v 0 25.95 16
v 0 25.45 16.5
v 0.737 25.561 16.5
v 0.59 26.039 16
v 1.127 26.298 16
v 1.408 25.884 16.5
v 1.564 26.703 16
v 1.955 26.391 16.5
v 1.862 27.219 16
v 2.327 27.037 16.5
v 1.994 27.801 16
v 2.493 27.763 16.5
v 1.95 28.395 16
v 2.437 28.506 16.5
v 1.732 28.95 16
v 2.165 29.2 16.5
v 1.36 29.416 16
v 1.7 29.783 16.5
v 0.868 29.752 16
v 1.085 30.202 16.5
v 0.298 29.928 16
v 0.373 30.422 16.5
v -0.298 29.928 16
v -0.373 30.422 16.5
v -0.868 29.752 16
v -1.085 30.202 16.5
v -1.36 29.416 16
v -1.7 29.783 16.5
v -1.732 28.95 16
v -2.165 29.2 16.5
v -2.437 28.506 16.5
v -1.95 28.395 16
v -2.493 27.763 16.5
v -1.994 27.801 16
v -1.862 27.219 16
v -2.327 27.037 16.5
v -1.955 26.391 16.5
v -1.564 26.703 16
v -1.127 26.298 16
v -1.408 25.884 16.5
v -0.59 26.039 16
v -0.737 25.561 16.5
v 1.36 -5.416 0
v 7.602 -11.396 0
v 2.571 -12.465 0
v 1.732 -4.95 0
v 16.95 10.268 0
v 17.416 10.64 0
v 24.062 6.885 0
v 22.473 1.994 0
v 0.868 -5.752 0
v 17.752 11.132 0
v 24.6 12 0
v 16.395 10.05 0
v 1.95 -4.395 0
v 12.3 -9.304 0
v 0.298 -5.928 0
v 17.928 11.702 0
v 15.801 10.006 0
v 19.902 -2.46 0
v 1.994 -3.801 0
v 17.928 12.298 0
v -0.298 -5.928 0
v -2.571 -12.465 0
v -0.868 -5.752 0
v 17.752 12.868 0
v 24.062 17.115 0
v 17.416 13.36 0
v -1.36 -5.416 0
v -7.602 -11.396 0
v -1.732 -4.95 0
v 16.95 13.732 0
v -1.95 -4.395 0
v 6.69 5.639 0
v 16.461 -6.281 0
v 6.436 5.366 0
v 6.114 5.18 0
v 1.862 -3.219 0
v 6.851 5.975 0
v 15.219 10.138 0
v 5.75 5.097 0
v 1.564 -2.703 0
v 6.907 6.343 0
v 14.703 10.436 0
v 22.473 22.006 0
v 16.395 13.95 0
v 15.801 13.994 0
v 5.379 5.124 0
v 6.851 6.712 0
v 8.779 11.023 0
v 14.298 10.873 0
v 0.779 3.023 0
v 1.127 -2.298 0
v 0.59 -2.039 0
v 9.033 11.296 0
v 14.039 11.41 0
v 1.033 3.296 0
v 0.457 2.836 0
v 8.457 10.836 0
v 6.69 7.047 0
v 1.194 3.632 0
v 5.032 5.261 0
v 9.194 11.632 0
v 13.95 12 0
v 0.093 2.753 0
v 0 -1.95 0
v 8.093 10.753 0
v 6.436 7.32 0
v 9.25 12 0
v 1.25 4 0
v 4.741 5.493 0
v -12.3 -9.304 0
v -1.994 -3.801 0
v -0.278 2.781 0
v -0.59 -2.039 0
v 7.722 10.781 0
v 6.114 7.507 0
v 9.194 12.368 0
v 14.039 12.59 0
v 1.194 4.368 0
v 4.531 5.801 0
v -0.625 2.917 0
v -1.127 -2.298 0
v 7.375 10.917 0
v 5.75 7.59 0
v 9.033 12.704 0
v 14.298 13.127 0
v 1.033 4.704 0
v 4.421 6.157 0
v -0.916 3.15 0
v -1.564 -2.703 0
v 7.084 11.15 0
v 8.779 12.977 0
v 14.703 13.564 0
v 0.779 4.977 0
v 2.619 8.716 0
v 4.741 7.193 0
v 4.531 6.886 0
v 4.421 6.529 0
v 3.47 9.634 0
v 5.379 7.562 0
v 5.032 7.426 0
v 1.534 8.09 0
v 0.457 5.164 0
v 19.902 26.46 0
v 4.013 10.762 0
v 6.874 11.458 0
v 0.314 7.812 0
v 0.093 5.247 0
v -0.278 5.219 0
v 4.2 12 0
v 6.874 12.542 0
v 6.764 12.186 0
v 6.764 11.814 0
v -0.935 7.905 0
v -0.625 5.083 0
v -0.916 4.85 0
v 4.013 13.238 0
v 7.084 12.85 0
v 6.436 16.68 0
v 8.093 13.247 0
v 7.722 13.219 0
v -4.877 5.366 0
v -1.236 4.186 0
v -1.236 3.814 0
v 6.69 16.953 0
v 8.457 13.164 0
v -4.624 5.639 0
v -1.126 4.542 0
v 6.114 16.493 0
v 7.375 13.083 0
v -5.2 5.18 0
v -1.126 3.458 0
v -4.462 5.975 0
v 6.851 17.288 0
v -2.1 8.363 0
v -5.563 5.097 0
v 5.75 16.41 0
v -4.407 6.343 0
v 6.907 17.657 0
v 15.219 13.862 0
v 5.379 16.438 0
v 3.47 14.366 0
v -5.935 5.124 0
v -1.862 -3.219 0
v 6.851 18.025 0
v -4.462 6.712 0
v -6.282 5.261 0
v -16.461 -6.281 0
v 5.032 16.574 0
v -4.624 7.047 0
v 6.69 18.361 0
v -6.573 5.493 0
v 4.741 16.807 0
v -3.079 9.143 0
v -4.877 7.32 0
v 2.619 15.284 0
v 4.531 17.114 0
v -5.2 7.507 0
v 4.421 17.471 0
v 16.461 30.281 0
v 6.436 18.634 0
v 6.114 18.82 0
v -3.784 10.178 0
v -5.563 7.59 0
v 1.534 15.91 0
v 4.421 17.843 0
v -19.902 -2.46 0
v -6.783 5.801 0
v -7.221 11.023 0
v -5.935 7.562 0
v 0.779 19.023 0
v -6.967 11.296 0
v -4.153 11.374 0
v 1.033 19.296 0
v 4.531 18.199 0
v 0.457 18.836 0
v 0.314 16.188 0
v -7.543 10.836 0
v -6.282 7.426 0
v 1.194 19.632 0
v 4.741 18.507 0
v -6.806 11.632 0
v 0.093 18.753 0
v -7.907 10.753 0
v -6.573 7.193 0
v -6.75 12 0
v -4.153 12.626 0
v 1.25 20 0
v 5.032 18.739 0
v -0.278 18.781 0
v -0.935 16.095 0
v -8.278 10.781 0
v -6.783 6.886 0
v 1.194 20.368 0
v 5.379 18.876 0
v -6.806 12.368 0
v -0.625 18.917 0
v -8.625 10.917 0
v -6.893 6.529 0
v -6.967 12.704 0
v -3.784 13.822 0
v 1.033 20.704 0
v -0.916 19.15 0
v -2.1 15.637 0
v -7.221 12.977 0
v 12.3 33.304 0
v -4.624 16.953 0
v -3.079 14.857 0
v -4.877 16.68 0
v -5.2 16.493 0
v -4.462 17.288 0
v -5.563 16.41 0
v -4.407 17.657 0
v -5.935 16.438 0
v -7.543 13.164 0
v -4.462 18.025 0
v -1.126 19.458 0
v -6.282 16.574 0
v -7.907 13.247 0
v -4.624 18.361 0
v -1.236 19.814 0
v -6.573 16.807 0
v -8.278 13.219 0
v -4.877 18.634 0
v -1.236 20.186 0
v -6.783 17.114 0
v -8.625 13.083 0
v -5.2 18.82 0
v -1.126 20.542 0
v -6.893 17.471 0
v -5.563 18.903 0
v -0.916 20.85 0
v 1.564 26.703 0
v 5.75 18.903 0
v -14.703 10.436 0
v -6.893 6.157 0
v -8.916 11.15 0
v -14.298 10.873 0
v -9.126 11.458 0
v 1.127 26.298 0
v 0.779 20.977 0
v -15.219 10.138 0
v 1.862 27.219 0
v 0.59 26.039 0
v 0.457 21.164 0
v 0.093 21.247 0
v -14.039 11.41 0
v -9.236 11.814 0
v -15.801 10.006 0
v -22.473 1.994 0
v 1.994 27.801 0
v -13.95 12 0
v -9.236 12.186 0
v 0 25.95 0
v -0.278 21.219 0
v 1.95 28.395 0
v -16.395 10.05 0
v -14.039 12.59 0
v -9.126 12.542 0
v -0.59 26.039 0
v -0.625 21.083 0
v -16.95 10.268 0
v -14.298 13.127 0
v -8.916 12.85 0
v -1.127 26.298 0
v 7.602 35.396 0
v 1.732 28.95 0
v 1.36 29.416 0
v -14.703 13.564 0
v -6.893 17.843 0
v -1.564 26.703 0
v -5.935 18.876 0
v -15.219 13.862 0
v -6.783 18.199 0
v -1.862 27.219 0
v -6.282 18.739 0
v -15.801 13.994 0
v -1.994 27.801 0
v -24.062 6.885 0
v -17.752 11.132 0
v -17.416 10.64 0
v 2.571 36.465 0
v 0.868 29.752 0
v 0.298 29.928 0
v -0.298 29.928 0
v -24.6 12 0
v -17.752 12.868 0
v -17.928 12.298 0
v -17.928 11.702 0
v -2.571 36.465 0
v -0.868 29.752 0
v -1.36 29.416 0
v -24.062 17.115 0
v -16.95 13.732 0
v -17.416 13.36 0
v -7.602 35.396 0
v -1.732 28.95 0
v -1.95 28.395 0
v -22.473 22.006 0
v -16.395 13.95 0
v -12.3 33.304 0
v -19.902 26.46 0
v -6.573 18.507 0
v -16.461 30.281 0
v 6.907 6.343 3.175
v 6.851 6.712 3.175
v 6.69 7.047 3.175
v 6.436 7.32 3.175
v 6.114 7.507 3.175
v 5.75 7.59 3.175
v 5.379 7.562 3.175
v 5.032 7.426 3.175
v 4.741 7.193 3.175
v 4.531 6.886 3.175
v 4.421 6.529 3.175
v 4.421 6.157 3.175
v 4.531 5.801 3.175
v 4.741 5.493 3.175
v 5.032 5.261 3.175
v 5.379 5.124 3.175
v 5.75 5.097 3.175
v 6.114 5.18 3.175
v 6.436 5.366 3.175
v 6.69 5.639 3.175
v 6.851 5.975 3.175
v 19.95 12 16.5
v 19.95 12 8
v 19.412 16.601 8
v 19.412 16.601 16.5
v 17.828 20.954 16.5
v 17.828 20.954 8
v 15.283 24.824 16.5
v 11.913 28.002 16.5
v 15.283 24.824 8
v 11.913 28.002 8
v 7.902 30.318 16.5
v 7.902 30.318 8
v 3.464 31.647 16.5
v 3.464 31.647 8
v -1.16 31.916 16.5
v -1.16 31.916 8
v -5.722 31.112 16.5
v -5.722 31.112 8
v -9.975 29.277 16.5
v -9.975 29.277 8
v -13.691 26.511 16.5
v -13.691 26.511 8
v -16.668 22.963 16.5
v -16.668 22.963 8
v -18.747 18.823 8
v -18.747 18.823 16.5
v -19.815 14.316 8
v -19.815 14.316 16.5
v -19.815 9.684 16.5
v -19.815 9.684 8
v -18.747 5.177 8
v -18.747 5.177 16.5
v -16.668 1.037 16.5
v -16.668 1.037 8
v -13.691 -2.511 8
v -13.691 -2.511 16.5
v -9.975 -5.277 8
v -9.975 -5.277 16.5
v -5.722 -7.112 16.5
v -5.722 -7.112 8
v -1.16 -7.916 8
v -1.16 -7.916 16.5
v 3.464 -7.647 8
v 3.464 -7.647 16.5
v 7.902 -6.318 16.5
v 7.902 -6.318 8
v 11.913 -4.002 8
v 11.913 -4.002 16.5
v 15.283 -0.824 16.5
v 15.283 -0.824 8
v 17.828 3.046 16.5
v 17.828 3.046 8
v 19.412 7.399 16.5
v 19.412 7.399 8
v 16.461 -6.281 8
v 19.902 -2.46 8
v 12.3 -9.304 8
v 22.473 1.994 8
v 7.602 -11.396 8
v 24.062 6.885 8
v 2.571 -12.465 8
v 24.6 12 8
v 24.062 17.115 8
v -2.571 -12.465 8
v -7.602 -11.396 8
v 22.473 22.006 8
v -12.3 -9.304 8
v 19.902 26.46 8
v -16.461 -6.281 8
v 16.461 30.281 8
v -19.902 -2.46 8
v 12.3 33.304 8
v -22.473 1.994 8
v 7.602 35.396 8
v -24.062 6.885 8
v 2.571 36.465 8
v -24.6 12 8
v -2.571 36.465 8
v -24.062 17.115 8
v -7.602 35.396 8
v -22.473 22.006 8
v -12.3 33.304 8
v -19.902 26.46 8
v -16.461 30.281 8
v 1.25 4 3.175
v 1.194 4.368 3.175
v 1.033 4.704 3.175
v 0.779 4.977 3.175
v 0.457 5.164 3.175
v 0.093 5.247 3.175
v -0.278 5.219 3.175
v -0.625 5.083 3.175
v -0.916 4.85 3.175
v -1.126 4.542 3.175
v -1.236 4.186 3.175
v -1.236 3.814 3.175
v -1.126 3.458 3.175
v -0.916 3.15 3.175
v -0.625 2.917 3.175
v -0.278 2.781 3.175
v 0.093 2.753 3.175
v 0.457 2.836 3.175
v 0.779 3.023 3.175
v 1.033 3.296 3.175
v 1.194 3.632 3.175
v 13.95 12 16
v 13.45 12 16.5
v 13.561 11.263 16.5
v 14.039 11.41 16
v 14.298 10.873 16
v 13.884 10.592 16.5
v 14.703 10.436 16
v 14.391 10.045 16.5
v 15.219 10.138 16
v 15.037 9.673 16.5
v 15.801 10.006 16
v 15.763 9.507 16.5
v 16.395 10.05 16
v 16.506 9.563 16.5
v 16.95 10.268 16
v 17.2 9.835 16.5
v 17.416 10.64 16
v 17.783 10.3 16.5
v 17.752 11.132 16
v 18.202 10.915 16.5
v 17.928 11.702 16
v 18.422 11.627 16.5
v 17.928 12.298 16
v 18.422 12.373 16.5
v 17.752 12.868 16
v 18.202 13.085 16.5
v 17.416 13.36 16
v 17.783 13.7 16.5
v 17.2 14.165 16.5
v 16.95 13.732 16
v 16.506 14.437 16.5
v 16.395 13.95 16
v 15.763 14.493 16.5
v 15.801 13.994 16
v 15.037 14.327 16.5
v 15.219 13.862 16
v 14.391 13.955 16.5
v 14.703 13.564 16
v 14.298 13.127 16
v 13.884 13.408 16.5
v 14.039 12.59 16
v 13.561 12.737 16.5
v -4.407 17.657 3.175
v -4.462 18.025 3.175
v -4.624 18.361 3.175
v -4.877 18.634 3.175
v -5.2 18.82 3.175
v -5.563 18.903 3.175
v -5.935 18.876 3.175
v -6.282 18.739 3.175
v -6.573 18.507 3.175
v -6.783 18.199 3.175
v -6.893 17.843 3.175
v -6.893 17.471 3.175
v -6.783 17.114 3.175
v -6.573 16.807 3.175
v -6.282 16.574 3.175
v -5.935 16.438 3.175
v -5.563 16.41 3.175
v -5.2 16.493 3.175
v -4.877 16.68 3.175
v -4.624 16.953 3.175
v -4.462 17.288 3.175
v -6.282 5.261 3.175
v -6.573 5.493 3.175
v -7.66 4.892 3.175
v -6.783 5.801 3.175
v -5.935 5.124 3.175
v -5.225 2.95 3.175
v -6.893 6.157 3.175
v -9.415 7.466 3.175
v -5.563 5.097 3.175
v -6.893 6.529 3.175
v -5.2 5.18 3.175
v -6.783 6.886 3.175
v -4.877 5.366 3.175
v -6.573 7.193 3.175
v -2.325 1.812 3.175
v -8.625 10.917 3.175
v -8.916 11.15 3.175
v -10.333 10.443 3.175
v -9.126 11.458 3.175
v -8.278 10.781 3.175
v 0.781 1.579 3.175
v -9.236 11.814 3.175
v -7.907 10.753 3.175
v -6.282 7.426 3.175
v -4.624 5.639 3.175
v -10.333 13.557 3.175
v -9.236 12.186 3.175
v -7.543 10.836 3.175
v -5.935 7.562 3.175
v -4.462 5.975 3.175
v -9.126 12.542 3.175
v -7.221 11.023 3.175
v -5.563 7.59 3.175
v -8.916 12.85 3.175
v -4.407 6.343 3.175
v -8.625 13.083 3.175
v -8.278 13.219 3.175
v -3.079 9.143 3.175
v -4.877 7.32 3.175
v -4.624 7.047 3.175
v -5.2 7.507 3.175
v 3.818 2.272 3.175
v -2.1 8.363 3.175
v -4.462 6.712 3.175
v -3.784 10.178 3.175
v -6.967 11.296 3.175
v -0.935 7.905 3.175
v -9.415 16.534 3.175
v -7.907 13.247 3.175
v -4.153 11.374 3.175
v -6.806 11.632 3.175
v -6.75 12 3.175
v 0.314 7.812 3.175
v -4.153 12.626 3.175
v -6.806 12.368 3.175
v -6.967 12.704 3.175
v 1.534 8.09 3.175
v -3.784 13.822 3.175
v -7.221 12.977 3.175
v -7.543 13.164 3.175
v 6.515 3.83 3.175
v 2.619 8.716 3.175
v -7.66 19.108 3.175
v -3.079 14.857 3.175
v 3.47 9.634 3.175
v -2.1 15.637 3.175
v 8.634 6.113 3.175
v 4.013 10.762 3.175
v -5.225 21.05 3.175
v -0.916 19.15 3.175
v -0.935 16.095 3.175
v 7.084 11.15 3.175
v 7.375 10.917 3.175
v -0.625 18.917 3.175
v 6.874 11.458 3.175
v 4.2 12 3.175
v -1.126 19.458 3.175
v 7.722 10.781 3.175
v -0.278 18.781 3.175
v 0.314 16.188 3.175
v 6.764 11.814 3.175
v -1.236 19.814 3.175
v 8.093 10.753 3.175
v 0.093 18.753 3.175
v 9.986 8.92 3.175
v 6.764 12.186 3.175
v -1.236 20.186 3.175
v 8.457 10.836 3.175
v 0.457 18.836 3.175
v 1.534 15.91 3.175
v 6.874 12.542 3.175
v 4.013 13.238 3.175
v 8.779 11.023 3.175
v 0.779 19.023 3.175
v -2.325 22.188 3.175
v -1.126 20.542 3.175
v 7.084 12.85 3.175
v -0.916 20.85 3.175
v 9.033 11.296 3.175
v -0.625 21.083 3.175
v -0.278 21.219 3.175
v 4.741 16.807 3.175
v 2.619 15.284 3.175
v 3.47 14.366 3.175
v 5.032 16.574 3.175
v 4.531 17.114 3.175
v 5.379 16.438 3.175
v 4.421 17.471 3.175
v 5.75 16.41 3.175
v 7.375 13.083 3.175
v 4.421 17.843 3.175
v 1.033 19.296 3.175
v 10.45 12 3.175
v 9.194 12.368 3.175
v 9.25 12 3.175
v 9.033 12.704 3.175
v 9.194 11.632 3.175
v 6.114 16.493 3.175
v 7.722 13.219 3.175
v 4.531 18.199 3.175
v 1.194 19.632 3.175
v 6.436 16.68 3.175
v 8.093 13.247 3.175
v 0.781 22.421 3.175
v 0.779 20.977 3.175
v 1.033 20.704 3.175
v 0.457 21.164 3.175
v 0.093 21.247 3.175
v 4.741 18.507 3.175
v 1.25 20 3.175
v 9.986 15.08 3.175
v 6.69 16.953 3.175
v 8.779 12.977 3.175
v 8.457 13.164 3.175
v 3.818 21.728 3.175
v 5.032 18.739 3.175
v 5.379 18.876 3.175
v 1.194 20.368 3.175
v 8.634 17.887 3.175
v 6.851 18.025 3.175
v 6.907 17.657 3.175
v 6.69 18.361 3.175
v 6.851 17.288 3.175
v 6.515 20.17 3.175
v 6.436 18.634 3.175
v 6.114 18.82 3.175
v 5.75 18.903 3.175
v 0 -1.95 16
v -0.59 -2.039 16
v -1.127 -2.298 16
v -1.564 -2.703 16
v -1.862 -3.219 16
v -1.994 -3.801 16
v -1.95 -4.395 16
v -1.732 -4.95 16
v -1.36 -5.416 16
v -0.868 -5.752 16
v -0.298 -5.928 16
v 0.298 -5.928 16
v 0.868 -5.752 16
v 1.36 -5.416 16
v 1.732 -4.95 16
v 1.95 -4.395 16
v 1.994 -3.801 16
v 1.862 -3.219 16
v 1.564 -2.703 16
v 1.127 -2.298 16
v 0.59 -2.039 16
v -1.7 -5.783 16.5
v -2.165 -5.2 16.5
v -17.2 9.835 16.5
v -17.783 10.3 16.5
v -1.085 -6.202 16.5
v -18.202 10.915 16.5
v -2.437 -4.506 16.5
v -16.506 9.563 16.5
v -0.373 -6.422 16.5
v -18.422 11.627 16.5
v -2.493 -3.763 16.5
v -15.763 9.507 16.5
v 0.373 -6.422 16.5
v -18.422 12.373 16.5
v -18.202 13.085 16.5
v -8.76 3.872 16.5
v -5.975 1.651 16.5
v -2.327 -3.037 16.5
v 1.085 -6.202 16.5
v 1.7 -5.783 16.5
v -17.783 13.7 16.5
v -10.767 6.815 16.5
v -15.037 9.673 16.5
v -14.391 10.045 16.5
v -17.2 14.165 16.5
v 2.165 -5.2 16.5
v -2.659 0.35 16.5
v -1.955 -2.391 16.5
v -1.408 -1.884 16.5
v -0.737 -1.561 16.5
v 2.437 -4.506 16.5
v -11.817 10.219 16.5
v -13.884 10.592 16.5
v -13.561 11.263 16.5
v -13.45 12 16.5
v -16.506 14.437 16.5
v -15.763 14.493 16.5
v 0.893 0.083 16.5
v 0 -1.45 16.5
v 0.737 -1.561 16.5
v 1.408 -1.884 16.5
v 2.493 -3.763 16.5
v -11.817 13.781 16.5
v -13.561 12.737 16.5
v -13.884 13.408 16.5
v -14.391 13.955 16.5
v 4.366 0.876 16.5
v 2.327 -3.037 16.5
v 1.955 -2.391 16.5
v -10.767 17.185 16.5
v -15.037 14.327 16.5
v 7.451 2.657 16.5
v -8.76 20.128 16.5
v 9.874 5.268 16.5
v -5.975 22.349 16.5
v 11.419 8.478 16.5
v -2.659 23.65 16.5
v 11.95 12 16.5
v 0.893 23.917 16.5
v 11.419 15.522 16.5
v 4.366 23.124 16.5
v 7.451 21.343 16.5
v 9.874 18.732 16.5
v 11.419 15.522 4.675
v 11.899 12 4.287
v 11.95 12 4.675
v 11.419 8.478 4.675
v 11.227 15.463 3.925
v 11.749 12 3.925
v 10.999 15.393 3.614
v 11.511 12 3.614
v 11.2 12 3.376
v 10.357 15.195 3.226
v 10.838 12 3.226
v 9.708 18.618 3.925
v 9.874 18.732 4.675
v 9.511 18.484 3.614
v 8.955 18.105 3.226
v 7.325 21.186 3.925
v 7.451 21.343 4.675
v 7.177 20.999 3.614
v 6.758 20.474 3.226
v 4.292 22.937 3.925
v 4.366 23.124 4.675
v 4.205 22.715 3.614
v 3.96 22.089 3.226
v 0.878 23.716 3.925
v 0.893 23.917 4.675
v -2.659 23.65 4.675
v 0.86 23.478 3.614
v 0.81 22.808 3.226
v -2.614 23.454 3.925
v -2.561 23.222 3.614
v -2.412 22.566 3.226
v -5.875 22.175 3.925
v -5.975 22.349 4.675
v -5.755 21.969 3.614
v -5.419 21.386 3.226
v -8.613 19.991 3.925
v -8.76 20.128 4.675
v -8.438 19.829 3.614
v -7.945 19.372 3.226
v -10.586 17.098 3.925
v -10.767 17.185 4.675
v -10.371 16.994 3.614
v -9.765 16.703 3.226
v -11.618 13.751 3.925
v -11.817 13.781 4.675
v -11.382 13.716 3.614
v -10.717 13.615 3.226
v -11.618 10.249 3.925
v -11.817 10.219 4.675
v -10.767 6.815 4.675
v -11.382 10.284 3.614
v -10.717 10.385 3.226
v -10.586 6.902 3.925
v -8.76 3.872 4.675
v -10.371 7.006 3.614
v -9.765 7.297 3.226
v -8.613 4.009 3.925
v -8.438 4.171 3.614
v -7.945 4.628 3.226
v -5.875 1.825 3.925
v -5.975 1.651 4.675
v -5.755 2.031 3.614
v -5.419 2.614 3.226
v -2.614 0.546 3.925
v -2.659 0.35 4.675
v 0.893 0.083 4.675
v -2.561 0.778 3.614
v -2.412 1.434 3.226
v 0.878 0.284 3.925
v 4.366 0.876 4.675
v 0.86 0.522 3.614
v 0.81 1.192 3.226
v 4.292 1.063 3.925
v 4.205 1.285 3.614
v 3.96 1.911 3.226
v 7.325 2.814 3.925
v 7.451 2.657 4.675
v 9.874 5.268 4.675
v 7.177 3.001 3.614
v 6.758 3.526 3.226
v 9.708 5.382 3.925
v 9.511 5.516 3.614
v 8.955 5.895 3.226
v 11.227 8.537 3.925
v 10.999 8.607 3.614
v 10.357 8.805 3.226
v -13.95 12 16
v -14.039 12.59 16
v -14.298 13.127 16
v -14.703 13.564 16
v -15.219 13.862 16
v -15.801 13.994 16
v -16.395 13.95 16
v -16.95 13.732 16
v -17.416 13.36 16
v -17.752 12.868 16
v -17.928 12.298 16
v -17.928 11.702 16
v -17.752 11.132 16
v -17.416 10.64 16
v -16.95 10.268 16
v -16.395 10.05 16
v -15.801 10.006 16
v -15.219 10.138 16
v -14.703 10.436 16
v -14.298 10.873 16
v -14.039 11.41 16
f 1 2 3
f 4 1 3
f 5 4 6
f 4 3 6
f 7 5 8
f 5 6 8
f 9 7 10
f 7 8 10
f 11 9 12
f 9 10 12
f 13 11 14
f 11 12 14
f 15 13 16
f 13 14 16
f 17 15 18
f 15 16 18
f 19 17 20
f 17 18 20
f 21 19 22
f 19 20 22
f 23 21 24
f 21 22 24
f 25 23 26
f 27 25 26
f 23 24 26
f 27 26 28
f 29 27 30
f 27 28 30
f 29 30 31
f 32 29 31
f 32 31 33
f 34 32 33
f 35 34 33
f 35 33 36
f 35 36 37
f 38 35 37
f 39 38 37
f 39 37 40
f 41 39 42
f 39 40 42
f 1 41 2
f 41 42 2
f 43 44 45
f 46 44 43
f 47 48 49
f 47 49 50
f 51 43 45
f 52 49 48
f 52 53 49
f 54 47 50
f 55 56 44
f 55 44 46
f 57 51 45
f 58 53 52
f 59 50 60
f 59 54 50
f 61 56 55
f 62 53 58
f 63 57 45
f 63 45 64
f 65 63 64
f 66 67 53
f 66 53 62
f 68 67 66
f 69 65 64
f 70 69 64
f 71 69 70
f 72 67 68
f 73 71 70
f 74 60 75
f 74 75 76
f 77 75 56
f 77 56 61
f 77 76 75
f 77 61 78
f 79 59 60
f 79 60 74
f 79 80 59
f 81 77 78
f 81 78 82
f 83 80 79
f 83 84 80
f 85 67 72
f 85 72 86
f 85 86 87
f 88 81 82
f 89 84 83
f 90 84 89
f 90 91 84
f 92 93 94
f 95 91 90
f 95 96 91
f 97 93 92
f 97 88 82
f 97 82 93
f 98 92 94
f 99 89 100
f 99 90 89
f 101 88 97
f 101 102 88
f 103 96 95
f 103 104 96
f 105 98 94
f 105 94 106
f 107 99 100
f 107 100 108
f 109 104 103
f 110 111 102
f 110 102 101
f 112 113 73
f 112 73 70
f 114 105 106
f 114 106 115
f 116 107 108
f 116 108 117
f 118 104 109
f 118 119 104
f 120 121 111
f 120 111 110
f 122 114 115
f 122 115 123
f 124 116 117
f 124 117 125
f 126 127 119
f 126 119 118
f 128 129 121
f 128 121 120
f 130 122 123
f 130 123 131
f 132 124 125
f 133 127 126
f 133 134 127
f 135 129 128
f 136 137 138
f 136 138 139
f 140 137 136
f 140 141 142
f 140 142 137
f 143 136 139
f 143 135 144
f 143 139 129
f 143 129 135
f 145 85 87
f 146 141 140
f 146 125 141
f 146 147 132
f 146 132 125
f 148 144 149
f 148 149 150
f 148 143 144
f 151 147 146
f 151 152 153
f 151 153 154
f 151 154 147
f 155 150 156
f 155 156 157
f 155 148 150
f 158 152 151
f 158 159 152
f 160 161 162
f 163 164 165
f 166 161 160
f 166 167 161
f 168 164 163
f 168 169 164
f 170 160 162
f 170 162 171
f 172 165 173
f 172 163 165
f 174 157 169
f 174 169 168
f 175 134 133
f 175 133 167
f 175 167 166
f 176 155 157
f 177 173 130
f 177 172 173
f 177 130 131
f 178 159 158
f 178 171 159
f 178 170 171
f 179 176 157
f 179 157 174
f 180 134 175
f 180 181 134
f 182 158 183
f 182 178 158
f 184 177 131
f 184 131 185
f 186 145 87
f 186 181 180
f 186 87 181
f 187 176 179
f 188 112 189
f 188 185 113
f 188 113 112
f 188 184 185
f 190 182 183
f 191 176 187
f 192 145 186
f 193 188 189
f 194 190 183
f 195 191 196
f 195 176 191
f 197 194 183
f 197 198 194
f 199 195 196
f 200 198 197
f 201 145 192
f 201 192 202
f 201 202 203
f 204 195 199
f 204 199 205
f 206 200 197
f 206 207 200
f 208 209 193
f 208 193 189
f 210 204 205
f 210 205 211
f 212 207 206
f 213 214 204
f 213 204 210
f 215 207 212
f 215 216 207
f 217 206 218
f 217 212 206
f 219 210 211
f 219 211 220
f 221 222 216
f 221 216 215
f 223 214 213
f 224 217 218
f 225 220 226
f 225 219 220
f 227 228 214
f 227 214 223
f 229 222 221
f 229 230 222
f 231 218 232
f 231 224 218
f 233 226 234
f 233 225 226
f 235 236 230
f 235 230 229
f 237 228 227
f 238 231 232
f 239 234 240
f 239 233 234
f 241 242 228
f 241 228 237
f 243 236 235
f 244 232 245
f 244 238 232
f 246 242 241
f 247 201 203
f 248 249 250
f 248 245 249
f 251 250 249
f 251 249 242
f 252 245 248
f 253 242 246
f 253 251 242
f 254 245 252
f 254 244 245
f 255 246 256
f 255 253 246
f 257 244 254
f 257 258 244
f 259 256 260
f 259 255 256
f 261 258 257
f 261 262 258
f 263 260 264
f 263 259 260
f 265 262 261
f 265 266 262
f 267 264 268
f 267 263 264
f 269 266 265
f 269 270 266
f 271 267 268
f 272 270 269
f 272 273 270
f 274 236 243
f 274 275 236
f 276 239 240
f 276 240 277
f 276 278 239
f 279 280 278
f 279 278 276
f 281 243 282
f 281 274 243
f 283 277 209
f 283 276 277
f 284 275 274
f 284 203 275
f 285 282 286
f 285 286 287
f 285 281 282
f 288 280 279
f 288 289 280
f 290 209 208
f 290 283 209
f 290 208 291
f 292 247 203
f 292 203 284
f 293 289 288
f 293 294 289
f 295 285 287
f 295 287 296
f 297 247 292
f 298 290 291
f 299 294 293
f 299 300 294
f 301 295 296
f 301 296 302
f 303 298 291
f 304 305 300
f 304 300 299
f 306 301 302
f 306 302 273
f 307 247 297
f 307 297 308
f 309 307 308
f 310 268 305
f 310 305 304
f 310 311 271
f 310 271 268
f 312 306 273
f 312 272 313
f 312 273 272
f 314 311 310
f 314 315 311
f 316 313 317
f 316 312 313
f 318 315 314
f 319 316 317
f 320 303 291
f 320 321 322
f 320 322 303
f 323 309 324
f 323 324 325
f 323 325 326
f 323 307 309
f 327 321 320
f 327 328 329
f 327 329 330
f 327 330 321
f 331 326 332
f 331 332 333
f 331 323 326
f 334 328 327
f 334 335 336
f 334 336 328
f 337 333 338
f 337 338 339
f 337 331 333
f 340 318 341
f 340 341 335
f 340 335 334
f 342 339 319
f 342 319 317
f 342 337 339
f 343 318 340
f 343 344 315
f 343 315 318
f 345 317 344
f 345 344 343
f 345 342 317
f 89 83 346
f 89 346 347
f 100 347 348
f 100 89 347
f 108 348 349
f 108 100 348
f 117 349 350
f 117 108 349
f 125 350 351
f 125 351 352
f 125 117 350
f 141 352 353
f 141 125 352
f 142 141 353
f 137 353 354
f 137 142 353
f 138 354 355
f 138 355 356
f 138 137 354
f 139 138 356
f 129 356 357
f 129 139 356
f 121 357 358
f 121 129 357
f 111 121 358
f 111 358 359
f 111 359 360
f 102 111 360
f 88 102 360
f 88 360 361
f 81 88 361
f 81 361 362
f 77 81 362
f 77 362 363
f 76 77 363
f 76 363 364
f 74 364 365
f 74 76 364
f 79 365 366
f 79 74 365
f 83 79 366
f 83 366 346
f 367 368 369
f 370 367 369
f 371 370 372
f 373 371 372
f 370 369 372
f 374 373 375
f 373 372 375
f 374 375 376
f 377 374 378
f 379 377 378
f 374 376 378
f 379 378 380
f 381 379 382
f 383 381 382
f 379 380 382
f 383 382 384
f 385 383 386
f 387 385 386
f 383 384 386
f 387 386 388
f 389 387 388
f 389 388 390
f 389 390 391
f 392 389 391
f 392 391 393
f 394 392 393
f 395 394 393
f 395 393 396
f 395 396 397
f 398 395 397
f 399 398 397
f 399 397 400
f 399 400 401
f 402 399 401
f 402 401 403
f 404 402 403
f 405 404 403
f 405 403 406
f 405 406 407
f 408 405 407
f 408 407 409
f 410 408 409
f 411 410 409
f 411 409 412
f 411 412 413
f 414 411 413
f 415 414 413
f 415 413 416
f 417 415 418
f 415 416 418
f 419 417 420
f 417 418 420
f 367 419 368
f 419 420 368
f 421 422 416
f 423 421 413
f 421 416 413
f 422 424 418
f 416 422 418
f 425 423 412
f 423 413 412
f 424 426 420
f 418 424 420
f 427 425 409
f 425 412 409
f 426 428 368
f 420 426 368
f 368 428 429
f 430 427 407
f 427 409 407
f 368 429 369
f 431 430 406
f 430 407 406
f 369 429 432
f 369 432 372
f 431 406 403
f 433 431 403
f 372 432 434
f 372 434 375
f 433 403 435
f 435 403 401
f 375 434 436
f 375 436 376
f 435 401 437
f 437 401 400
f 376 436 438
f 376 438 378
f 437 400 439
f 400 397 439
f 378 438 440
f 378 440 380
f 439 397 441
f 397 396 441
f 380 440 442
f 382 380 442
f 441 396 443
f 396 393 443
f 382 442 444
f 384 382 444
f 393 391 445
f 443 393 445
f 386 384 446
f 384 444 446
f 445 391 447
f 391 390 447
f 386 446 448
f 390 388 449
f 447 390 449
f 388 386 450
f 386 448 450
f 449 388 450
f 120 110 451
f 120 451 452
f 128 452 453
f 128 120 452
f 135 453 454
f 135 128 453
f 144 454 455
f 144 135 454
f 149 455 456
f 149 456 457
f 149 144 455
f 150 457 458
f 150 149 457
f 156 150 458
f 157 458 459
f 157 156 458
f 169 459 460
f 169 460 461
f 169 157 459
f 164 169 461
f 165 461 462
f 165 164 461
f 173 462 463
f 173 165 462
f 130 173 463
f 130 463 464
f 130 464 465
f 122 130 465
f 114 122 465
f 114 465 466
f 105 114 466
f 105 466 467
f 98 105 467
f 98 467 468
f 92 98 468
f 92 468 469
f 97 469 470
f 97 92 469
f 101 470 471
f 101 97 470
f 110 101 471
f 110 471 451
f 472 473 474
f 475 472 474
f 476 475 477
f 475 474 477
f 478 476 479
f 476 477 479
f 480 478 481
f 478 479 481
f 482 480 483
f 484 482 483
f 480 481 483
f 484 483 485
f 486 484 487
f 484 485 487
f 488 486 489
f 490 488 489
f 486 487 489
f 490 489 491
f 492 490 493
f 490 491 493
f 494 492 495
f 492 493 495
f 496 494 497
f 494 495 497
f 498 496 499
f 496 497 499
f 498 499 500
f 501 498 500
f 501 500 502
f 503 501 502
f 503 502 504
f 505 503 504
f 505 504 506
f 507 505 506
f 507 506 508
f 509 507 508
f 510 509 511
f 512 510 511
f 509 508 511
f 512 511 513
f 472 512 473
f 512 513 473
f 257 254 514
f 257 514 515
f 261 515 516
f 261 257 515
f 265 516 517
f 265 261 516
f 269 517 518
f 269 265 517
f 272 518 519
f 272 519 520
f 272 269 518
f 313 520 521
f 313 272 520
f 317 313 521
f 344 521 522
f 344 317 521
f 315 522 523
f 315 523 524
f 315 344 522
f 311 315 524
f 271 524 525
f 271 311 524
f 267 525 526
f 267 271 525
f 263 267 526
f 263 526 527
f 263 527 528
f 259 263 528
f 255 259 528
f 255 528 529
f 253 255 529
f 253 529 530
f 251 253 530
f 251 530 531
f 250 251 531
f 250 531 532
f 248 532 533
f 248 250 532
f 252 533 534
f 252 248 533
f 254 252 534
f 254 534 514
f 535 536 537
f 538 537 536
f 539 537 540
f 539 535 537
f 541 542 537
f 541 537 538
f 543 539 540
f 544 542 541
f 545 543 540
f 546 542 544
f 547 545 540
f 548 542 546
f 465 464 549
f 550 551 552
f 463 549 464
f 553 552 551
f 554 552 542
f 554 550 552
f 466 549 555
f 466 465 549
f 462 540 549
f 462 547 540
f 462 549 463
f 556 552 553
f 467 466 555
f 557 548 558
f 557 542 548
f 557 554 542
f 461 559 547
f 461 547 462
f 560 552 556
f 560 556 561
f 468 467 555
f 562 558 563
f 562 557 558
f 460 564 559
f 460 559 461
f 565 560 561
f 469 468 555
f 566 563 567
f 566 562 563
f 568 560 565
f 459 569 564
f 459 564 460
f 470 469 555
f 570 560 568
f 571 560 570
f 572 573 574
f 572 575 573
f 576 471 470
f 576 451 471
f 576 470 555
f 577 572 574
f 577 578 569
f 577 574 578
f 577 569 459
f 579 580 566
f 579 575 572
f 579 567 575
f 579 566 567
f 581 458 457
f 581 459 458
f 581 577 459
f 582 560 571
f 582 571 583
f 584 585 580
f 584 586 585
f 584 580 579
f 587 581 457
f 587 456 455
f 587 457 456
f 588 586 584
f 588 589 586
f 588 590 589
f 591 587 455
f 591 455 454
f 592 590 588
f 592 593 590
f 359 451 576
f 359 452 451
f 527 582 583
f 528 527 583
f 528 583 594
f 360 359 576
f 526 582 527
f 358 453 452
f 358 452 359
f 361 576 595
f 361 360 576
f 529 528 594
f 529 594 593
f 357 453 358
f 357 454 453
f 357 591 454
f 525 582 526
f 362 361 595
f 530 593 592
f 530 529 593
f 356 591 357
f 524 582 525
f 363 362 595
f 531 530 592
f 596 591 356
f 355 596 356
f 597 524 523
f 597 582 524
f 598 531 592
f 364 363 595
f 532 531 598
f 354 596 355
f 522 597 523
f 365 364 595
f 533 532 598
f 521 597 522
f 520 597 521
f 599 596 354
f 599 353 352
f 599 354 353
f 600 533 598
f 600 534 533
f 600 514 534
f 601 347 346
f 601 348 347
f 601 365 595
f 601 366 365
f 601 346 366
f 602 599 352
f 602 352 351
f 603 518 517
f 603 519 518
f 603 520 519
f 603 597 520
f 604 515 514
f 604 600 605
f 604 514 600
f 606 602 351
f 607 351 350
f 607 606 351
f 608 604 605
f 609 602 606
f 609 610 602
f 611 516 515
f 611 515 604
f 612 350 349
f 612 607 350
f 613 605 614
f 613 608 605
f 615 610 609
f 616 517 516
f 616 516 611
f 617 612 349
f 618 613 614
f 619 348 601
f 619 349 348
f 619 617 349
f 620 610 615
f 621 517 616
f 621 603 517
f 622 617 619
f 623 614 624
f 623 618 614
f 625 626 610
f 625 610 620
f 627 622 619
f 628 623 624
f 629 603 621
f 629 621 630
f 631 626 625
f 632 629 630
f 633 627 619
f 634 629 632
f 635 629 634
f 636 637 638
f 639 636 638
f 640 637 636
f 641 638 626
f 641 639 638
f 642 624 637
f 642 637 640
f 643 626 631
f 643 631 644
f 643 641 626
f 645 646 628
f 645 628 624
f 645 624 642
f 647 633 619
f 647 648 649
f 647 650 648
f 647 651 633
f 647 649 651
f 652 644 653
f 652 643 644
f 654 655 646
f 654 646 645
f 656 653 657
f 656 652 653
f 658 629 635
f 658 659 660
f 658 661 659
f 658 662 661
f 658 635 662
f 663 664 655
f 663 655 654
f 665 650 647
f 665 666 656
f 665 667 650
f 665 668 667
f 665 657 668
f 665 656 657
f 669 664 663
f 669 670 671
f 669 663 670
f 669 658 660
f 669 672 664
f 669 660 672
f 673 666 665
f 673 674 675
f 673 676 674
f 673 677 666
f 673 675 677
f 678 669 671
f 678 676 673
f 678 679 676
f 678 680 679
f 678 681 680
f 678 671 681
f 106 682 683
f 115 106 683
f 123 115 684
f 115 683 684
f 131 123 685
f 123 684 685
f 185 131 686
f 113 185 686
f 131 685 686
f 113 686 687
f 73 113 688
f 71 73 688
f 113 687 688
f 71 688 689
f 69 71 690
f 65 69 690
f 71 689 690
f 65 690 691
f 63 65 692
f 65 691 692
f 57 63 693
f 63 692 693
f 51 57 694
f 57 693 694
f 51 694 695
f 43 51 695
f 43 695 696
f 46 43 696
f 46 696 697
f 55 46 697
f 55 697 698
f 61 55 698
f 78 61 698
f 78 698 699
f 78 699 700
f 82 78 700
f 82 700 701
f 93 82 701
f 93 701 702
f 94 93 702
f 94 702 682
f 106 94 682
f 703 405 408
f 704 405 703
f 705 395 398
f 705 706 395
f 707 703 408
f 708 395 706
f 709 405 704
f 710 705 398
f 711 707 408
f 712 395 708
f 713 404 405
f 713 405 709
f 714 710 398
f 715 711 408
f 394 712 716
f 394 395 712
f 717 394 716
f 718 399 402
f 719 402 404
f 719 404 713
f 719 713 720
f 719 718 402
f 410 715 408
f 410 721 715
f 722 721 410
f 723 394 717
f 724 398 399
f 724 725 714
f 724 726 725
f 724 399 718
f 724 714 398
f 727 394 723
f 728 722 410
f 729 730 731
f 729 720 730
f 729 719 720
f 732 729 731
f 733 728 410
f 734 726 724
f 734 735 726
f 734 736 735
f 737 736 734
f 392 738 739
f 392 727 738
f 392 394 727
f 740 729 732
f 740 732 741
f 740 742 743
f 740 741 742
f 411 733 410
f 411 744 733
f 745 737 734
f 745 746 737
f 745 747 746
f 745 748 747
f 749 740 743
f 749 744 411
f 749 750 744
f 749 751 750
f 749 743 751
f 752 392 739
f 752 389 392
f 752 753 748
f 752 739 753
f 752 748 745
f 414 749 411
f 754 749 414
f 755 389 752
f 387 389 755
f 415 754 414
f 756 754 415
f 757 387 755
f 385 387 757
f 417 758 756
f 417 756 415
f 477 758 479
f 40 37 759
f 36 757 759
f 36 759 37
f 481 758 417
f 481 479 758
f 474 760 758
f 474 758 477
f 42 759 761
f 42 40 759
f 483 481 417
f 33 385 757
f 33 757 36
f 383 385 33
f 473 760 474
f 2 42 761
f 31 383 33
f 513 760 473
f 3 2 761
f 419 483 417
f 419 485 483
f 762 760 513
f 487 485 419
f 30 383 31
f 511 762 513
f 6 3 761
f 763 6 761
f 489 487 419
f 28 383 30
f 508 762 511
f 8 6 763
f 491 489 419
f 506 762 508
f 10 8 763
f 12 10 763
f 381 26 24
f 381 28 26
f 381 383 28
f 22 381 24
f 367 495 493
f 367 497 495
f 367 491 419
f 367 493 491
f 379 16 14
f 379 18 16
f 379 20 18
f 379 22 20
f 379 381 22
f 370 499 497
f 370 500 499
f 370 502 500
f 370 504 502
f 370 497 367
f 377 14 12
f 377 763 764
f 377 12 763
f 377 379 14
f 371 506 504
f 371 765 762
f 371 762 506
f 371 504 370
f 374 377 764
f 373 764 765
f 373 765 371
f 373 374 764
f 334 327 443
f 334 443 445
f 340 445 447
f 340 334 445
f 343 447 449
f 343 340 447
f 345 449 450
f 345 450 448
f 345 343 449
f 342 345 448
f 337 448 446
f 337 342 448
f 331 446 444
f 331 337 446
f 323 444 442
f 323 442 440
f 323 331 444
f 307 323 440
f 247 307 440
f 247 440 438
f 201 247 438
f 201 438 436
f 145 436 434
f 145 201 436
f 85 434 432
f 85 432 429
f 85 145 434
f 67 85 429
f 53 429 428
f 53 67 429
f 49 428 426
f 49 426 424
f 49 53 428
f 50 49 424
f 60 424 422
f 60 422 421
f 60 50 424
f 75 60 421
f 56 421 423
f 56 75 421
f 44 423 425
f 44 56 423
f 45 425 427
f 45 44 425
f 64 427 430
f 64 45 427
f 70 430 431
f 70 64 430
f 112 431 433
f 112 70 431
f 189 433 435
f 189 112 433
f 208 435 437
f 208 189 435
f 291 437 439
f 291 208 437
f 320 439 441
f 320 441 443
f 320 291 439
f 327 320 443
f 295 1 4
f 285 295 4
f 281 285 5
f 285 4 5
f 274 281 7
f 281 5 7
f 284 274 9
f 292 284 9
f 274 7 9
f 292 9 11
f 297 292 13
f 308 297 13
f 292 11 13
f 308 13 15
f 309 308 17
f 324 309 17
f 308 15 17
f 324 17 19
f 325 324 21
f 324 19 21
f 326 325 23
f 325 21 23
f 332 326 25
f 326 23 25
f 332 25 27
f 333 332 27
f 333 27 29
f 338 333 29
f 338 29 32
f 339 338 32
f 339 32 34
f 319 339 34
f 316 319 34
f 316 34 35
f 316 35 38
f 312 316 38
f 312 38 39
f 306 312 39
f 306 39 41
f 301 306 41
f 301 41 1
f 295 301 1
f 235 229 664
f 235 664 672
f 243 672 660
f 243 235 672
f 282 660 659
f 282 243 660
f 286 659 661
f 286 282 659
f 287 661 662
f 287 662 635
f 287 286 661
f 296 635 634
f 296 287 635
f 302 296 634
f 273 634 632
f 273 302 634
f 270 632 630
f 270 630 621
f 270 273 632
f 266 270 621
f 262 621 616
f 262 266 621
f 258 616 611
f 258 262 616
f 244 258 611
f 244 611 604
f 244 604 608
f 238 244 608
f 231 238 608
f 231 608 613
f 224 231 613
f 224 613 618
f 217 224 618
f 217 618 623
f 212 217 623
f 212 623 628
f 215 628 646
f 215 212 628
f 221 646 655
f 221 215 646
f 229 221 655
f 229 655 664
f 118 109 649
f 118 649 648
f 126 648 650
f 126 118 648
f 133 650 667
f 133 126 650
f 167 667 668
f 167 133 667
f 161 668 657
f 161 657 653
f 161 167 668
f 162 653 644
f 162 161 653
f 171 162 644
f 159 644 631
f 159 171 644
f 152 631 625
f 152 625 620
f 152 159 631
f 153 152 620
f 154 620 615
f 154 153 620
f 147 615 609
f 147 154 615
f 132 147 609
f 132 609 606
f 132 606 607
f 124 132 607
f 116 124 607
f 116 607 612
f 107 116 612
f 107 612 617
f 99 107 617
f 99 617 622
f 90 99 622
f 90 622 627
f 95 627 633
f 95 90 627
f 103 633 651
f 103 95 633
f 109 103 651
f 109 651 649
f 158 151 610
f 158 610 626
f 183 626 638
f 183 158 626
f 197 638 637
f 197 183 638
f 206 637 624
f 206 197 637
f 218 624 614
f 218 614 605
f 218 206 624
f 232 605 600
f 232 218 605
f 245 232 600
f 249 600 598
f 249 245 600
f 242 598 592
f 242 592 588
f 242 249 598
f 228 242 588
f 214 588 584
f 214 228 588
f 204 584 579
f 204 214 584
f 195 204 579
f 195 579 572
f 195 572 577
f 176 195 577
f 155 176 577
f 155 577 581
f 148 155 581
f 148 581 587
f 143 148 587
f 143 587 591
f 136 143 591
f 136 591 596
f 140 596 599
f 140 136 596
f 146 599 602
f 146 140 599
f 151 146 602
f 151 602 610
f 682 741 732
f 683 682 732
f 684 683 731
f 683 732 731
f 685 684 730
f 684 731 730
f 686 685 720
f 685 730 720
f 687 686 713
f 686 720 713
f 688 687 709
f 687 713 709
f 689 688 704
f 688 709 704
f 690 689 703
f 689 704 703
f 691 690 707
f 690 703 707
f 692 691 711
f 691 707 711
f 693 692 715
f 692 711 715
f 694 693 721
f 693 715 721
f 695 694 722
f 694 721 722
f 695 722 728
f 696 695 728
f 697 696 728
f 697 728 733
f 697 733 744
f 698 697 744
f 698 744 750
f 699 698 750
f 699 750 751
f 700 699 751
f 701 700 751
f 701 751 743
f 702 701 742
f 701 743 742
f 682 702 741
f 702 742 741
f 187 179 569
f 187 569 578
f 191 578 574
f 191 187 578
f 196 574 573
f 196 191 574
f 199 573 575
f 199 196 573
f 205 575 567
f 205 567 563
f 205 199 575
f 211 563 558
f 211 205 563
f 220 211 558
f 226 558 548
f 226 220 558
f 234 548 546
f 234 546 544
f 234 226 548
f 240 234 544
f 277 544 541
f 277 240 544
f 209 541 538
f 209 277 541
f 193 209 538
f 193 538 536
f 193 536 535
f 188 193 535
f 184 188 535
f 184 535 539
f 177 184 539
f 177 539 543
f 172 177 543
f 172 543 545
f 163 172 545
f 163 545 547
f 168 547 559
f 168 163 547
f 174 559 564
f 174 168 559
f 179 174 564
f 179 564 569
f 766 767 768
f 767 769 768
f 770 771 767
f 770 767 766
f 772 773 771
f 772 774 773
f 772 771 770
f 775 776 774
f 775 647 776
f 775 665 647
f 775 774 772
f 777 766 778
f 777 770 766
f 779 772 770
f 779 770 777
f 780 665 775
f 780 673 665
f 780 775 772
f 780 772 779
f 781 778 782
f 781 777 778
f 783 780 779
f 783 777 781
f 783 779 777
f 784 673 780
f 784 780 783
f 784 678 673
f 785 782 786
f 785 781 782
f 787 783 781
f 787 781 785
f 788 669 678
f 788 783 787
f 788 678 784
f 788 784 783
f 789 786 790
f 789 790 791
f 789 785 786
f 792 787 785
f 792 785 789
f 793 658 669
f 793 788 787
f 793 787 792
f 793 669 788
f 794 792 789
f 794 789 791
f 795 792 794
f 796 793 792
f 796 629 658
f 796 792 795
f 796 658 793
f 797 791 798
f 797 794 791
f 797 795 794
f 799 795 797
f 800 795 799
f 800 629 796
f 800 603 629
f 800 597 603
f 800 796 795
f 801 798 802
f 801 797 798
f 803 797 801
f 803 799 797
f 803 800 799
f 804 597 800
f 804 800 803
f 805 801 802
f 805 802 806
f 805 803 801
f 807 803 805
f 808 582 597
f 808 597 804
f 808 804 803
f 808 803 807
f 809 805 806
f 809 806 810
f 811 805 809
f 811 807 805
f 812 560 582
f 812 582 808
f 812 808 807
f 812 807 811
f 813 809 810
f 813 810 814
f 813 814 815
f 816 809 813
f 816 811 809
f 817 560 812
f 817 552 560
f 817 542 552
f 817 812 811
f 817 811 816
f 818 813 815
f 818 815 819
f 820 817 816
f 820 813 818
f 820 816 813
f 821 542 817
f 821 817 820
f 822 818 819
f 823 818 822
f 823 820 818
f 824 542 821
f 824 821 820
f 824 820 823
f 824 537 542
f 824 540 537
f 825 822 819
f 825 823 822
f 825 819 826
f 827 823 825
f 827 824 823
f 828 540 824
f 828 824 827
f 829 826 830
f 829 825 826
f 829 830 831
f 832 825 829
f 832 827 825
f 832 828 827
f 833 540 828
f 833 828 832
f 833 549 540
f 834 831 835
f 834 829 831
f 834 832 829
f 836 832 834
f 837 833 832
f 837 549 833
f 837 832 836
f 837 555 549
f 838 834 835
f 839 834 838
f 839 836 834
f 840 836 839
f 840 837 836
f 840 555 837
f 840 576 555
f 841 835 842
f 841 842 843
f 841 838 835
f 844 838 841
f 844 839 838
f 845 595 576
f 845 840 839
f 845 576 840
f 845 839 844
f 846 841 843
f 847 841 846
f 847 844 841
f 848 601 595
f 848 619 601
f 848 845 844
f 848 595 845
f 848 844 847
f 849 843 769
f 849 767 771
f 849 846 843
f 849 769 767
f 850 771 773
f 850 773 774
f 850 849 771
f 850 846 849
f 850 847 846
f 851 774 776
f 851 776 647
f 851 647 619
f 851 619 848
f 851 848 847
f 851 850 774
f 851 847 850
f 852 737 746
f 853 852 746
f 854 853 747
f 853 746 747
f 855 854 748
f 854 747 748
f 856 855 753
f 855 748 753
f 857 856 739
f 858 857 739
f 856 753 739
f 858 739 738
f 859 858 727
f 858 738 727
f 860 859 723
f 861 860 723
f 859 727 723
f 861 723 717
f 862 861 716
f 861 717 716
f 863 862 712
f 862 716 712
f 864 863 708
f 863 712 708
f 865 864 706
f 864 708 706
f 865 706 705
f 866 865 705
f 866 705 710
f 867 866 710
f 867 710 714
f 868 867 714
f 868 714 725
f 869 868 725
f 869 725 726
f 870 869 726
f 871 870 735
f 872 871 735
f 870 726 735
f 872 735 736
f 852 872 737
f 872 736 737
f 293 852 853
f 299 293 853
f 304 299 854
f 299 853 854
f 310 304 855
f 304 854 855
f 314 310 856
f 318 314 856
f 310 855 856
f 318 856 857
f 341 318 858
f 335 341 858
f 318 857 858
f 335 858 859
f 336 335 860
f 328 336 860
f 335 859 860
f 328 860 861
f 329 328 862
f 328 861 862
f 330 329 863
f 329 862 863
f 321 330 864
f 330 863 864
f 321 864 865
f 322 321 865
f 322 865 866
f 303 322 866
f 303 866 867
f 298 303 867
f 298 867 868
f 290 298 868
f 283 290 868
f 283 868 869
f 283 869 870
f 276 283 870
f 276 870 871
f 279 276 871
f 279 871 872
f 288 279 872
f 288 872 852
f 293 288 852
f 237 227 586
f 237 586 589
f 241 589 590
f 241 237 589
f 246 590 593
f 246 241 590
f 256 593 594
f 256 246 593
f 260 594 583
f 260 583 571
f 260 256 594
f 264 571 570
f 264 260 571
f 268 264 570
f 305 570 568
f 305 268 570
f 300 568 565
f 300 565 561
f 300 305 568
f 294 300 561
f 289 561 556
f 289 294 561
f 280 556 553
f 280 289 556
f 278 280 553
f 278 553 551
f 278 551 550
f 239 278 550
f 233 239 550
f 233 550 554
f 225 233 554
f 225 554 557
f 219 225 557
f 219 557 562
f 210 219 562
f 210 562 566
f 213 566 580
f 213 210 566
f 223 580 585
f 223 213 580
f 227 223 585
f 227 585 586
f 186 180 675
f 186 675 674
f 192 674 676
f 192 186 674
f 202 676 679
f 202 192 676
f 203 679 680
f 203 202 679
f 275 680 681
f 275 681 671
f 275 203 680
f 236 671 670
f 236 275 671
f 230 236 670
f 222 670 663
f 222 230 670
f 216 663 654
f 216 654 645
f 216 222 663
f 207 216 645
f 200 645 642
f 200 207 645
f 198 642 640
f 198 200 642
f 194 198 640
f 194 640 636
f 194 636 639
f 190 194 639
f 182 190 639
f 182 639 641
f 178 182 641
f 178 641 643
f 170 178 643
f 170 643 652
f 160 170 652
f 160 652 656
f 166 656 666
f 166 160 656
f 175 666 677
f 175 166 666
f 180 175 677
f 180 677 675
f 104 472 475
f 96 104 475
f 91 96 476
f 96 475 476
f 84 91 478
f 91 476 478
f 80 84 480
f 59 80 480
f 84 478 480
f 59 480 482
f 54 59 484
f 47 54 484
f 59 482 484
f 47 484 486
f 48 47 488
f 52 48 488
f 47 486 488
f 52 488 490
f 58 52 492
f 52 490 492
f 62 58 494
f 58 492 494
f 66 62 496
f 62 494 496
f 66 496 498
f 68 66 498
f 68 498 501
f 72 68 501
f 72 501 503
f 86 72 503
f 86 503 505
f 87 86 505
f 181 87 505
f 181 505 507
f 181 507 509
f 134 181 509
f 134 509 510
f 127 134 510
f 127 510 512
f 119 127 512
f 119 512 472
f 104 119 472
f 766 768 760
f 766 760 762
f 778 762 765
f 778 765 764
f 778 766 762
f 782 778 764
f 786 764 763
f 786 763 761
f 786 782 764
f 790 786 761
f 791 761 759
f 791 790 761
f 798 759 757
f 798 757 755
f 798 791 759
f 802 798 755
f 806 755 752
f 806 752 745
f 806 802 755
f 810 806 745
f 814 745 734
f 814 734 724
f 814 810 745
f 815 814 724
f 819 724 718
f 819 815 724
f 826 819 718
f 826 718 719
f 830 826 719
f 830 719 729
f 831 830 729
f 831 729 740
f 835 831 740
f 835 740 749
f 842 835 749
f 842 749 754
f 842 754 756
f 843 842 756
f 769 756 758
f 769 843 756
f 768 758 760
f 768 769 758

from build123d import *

# Parameters (mm, degrees)
SKETCH1_R           = 19.75
SKETCH1_R_2         = 4.2
SKETCH1_R_3         = 1.25
BOSS_EXTRUDE1_DEPTH = 3.175
SKETCH3_R           = 19.95
SKETCH3_R_2         = 11.95
BOSS_EXTRUDE2_DEPTH = 13.325
SKETCH4_R           = 2
CUT_EXTRUDE1_DEPTH  = 42.12243913
CIRPATTERN1_COUNT   = 4
SKETCH5_R           = 24.6
SKETCH5_R_2         = 19.75
BOSS_EXTRUDE3_DEPTH = 8
CHAMFER1_SIZE       = 0.5
FILLET1_R           = 1.5


with BuildPart() as part:
    # Sketch1 → Boss-Extrude1 (new body)
    with BuildSketch(Plane.XY):
        with Locations((0, 12)):
            Circle(SKETCH1_R)
        with Locations((0, 12)):
            Circle(SKETCH1_R_2, mode=Mode.SUBTRACT)
        with Locations((5.656854249, 17.656854249)):
            Circle(SKETCH1_R_3, mode=Mode.SUBTRACT)
        with Locations((8, 12)):
            Circle(SKETCH1_R_3, mode=Mode.SUBTRACT)
        with Locations((5.656854249, 6.343145751)):
            Circle(SKETCH1_R_3, mode=Mode.SUBTRACT)
        with Locations((0, 4)):
            Circle(SKETCH1_R_3, mode=Mode.SUBTRACT)
        with Locations((-5.656854249, 6.343145751)):
            Circle(SKETCH1_R_3, mode=Mode.SUBTRACT)
        with Locations((-8, 12)):
            Circle(SKETCH1_R_3, mode=Mode.SUBTRACT)
        with Locations((-5.656854249, 17.656854249)):
            Circle(SKETCH1_R_3, mode=Mode.SUBTRACT)
        with Locations((0, 20)):
            Circle(SKETCH1_R_3, mode=Mode.SUBTRACT)
    extrude(amount=BOSS_EXTRUDE1_DEPTH)

    # Sketch3 → Boss-Extrude2 (add)
    with BuildSketch(Plane.XY.offset(3.175)):
        with Locations((0, 12)):
            Circle(SKETCH3_R)
        with Locations((0, 12)):
            Circle(SKETCH3_R_2, mode=Mode.SUBTRACT)
    extrude(amount=BOSS_EXTRUDE2_DEPTH)

    # Sketch4 → Cut-Extrude1 (cut, through all)
    with BuildSketch(Plane.XY.offset(16.5)):
        with Locations((-15.95, 12)):
            Circle(SKETCH4_R)
    cut_extrude1 = extrude(amount=-CUT_EXTRUDE1_DEPTH, mode=Mode.SUBTRACT)

    # CirPattern1: Cut-Extrude1 ×4 about axis
    cirpattern1_axis = Axis((0, 12, 0), (0, 0, 1))
    for i in range(1, CIRPATTERN1_COUNT):
        add(cut_extrude1.rotate(cirpattern1_axis, i * 360 / CIRPATTERN1_COUNT), mode=Mode.SUBTRACT)

    # Sketch5 → Boss-Extrude3 (add)
    with BuildSketch(Plane(origin=(0, 0, 0), x_dir=(-1, 0, 0), z_dir=(0, 0, -1))):
        with Locations((0, 12)):
            Circle(SKETCH5_R)
        with Locations((0, 12)):
            Circle(SKETCH5_R_2, mode=Mode.SUBTRACT)
    extrude(amount=-BOSS_EXTRUDE3_DEPTH)

    # Chamfer1
    chamfer1_edges = [part.edges().sort_by_distance(p)[0] for p in [
        (-17.95, 12, 16.5),
        (0, -5.95, 16.5),
        (17.95, 12, 16.5),
        (0, 29.95, 16.5),
    ]]
    chamfer(chamfer1_edges, length=CHAMFER1_SIZE)

    # Fillet1
    fillet1_edges = [part.edges().sort_by_distance(p)[0] for p in [
        (-11.95, 12, 3.175),
    ]]
    fillet(fillet1_edges, radius=FILLET1_R)


solid = part.part
